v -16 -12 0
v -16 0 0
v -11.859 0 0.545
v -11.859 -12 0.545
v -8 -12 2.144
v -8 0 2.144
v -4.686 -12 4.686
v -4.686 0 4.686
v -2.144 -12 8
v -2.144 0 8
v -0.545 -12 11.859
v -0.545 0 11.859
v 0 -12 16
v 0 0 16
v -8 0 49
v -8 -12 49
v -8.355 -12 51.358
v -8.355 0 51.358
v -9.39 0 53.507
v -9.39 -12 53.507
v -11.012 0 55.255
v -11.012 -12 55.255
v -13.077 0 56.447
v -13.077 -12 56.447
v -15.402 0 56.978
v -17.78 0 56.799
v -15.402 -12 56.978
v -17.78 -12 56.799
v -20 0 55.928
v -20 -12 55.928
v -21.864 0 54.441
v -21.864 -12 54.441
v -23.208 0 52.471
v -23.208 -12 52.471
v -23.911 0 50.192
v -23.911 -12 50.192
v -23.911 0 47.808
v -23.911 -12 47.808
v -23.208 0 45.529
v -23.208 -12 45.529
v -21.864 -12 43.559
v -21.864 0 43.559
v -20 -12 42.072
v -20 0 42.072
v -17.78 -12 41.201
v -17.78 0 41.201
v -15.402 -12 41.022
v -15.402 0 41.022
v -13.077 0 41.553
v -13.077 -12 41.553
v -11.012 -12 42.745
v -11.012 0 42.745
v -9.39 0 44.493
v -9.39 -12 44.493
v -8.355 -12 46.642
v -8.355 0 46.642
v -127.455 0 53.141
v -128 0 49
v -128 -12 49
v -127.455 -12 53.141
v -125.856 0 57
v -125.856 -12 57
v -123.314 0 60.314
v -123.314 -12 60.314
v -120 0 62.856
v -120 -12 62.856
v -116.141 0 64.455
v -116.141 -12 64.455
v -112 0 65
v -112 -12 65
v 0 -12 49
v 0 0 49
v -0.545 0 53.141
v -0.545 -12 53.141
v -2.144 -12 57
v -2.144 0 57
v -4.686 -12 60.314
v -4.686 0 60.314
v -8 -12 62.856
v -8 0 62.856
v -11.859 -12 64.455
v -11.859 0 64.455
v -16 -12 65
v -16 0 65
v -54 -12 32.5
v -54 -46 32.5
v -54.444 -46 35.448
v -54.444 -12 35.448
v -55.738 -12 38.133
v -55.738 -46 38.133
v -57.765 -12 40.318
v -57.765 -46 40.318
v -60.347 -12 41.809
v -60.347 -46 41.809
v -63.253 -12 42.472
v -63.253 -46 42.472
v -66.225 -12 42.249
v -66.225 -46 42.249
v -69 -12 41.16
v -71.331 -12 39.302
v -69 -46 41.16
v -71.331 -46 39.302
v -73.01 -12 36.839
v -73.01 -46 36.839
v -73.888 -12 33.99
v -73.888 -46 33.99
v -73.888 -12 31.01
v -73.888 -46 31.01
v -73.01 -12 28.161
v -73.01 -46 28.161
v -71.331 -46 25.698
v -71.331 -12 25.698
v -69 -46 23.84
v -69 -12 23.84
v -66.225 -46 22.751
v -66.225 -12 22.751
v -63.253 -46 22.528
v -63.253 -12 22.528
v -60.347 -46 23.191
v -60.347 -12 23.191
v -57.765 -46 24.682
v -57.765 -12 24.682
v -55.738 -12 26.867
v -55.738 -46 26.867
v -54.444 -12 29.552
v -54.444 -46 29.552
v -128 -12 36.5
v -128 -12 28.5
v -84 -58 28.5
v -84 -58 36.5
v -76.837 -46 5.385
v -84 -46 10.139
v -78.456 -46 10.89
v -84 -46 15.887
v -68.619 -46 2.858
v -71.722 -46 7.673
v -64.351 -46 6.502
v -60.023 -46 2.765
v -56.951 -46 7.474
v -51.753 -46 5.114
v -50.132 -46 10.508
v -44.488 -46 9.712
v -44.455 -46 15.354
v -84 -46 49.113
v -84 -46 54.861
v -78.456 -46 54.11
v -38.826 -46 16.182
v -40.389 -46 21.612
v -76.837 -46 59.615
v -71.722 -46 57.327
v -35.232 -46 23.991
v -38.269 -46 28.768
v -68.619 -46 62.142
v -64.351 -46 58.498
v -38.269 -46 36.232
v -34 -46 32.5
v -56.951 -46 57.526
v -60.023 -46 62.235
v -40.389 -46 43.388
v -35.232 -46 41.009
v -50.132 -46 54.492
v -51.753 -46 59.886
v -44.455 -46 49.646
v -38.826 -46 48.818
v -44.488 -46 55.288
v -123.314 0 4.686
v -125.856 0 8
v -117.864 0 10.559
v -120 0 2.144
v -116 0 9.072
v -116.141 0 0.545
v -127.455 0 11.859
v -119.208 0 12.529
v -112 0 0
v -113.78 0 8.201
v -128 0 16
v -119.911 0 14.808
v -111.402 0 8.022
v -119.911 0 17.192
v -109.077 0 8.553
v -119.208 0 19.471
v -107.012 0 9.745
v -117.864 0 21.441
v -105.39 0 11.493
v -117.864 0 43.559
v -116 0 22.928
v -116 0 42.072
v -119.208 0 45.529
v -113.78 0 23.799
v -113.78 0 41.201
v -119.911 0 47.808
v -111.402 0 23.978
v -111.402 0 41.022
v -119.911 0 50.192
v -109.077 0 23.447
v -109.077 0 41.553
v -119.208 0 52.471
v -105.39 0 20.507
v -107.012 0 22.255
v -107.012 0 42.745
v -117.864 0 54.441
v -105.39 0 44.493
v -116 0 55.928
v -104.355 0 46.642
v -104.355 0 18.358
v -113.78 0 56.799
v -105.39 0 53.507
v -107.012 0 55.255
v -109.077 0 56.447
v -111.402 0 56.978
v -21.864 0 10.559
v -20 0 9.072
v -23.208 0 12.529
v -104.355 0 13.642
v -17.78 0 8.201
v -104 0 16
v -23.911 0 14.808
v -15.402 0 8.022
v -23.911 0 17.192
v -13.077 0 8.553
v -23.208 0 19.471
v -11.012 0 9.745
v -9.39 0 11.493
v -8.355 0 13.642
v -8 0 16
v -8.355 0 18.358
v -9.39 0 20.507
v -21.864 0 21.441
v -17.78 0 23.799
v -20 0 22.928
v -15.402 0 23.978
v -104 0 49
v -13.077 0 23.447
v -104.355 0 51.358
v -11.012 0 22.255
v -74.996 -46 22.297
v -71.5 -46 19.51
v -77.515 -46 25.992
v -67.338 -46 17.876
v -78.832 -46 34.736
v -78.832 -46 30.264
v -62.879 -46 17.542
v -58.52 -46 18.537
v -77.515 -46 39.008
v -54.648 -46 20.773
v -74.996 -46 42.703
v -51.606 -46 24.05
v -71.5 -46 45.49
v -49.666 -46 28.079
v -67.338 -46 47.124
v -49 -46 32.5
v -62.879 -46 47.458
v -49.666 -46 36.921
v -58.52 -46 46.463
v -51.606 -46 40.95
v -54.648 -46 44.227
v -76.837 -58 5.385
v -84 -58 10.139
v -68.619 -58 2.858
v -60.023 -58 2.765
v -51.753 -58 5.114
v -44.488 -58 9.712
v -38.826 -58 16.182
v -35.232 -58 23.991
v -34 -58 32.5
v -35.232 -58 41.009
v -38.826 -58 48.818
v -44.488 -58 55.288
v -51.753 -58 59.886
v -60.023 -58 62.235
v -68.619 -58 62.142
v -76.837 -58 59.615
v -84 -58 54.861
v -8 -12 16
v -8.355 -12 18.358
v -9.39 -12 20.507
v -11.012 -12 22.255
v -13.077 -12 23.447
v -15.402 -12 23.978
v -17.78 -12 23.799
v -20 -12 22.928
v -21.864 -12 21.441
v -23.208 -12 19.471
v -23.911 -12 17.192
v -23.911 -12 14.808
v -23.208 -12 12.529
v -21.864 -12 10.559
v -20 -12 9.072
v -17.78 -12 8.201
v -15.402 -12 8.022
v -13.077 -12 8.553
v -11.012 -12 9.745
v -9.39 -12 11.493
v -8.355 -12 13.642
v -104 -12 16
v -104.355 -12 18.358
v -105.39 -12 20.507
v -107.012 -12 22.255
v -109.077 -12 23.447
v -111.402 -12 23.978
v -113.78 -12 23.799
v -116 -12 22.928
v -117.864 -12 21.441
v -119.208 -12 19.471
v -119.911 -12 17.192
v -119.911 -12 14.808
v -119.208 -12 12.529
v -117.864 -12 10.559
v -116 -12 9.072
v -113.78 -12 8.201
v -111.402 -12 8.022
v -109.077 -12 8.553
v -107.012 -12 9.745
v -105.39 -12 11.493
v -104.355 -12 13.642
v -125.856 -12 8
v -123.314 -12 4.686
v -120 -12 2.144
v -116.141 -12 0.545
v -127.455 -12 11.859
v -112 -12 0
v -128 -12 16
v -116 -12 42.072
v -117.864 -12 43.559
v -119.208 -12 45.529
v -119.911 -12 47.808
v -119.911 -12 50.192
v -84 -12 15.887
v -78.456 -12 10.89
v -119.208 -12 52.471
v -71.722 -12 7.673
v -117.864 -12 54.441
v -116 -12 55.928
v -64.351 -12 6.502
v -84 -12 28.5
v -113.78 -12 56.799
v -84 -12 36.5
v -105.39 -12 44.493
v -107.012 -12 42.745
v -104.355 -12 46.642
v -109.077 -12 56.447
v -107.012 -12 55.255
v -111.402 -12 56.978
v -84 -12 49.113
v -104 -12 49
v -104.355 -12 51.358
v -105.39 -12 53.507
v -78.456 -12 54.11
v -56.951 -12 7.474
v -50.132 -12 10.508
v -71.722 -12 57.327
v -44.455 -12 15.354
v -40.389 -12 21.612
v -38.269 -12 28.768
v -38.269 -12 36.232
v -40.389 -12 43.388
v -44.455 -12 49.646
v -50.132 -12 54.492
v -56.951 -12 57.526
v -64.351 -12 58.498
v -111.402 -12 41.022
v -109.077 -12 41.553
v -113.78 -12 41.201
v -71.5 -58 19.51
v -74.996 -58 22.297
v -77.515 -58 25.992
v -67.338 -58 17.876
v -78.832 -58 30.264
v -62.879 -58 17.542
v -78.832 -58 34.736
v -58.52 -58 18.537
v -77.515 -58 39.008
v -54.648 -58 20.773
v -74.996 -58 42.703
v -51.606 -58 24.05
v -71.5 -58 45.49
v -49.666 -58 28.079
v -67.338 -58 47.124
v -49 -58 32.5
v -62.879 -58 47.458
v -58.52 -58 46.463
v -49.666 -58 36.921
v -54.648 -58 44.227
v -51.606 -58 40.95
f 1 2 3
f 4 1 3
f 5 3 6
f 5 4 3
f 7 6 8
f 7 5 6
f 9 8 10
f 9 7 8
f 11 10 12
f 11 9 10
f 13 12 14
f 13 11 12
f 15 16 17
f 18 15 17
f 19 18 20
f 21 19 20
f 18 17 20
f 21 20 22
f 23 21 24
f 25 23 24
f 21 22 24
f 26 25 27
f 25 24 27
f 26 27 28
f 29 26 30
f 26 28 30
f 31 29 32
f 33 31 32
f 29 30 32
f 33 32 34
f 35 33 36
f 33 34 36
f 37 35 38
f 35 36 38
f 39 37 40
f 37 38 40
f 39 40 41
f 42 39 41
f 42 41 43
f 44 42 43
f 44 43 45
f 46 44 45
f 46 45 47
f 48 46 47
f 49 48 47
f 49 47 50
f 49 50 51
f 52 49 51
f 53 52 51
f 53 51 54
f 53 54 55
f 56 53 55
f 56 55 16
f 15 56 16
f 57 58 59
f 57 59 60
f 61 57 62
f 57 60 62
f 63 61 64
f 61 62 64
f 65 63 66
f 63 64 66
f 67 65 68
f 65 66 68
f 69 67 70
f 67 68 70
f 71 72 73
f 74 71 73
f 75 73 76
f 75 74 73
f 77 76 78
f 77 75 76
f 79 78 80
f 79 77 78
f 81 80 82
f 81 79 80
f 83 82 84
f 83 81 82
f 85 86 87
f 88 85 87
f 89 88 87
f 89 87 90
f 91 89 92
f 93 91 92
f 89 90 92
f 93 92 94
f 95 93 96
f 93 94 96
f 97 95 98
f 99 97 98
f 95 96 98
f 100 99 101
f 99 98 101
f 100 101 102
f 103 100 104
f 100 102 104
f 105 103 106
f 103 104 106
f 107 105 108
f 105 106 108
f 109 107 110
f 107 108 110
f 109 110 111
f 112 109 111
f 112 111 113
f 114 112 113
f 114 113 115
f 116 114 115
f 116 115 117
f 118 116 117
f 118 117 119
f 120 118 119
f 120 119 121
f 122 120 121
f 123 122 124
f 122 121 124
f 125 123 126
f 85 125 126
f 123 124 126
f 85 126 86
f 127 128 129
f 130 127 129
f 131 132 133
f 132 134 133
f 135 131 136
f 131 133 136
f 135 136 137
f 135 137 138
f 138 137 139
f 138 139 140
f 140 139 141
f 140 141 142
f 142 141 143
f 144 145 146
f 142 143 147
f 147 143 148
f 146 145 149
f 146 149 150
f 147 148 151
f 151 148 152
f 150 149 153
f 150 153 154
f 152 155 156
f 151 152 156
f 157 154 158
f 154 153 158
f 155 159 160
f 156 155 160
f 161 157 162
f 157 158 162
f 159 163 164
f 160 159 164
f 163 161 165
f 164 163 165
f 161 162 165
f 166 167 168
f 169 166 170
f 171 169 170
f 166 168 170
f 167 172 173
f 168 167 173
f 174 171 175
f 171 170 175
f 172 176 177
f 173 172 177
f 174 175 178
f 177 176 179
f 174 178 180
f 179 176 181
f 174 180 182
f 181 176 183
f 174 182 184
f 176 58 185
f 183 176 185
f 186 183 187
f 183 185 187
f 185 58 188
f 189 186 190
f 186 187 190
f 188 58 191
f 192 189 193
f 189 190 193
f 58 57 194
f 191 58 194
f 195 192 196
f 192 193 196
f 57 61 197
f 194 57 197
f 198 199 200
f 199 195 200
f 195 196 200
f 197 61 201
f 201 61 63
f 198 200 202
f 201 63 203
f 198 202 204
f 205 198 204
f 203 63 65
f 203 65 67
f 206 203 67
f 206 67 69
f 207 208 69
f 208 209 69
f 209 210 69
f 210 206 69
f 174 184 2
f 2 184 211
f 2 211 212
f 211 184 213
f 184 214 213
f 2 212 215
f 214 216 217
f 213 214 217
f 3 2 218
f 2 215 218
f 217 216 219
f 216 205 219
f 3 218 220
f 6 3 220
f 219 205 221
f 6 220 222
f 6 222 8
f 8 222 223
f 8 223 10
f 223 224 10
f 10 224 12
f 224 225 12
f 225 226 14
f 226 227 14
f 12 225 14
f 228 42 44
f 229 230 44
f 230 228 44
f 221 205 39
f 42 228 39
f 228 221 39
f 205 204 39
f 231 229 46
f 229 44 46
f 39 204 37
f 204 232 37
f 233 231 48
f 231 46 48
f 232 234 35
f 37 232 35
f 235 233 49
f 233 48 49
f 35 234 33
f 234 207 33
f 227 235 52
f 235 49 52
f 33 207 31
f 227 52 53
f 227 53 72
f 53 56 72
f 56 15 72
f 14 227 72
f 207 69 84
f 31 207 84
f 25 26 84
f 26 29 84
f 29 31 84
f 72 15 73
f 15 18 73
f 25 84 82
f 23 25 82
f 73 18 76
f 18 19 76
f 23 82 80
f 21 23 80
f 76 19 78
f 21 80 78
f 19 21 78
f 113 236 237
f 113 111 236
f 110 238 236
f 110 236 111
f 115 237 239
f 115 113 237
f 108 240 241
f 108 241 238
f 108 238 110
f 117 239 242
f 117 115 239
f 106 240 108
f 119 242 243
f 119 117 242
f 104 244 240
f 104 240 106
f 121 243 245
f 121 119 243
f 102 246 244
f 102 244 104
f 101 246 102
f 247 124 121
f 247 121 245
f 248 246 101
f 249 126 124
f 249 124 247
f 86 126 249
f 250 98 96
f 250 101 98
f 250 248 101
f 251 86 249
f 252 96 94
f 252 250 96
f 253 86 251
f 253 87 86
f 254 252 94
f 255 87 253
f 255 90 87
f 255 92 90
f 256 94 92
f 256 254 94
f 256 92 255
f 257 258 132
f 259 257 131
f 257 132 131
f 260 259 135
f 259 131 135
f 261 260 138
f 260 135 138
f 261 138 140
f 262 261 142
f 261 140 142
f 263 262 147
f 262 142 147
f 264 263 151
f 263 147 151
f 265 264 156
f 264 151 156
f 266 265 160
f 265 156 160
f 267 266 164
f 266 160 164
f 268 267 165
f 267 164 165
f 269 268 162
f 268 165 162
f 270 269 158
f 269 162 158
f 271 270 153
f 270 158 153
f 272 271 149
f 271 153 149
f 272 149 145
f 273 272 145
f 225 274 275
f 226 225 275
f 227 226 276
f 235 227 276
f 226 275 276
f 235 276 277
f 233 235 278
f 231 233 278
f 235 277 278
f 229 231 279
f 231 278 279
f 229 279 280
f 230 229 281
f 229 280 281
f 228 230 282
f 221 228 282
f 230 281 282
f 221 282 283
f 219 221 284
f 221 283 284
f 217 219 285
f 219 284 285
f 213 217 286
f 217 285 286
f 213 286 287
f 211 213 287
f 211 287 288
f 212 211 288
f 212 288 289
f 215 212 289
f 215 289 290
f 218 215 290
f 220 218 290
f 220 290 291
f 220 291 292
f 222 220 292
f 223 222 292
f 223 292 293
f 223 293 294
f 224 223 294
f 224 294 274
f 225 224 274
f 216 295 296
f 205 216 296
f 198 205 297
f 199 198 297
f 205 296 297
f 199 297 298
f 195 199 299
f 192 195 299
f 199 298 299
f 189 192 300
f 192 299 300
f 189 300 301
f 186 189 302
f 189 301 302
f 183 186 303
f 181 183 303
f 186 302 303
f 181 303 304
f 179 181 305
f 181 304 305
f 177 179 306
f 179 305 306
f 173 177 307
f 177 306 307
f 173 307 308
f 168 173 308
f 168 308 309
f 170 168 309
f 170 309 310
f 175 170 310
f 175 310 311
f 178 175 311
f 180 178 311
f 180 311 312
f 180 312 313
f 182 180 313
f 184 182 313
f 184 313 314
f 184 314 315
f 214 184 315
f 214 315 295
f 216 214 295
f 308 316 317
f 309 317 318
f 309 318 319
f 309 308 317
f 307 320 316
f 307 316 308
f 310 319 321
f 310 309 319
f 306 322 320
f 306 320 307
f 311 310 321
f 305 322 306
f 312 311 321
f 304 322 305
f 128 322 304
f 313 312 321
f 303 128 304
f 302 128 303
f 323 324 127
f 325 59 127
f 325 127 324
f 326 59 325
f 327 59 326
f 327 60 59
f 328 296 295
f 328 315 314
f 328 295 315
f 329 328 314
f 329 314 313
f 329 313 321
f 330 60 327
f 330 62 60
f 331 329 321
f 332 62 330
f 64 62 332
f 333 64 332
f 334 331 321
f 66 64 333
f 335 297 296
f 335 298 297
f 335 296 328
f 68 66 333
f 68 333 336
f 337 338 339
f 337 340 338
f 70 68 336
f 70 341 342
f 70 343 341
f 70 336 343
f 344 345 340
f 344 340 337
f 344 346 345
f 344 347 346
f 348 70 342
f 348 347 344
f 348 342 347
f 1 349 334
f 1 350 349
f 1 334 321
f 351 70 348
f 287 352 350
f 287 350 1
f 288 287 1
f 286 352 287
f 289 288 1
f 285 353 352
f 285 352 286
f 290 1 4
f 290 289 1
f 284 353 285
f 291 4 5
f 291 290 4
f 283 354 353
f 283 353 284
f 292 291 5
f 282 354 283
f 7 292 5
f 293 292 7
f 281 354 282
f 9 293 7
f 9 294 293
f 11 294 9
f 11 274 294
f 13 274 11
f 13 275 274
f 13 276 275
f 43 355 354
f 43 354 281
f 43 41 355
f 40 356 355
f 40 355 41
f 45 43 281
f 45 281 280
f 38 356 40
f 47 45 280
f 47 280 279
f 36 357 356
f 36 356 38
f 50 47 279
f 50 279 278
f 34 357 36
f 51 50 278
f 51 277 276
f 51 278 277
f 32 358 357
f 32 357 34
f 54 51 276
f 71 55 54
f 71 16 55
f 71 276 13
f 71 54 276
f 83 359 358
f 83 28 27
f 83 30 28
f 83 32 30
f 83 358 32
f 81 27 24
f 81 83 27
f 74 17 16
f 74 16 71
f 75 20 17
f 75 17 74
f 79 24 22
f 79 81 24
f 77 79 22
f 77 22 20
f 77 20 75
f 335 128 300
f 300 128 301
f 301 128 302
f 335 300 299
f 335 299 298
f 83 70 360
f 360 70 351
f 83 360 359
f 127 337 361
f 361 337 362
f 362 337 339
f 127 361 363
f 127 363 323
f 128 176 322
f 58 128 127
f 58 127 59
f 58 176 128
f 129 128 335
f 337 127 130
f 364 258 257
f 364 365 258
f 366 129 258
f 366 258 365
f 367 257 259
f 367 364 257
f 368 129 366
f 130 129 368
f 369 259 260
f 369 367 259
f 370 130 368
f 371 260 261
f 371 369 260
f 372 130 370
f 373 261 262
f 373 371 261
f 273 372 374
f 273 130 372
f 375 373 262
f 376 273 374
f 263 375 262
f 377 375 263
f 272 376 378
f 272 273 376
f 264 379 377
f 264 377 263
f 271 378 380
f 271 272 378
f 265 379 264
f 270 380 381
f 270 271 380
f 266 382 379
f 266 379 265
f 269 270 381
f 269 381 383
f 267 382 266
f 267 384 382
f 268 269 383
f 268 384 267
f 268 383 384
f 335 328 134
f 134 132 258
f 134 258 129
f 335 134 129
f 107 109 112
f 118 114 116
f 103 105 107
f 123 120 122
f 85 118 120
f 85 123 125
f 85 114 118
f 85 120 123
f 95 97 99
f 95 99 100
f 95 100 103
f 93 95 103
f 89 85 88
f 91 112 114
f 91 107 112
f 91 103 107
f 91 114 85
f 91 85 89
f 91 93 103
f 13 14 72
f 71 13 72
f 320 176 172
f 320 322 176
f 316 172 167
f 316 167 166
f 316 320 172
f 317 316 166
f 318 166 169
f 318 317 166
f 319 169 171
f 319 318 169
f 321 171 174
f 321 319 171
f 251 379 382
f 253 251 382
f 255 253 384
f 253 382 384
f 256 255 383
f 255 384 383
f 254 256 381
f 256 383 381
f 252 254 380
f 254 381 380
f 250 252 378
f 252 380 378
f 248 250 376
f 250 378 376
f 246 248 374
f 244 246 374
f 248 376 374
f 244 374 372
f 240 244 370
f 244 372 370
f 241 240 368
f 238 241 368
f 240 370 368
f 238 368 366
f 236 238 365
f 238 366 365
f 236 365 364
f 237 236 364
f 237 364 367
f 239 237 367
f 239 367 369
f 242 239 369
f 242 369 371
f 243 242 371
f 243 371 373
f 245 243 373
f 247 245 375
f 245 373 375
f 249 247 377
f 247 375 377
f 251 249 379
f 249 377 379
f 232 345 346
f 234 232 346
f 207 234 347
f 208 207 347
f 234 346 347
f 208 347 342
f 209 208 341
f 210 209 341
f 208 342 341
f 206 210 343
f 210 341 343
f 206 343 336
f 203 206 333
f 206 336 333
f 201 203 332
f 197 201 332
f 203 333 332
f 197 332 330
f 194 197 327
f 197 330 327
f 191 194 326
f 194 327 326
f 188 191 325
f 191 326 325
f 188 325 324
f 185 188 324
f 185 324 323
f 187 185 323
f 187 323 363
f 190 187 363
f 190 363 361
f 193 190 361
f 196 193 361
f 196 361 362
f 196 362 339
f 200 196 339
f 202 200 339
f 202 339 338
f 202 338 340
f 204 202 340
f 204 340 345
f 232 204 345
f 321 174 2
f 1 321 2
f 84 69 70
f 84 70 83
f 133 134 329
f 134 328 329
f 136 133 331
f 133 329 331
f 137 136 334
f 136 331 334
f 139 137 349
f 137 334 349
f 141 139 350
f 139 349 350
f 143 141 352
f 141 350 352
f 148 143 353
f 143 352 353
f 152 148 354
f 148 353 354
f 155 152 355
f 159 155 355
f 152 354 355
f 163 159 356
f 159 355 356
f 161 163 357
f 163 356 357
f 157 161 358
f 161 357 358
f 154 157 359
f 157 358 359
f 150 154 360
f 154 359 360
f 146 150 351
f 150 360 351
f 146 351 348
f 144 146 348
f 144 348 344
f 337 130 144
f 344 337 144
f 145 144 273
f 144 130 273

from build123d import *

# Parameters (mm, degrees)
F0_W      = 128
F0_H      = 65
F1_DEPTH  = 12
F2_R      = 16
F3_R      = 26
F4_DEPTH  = 34
F5_R      = 30
F6_DEPTH  = 12
F7_R      = 15
F8_DEPTH  = 12
F9_R      = 10
F10_DEPTH = 34
F12_DEPTH = 46
F13_W     = 44
F13_H     = 8
F14_DEPTH = 46
F16_DEPTH = 25
F17_R     = 8
F18_DEPTH = 25


with BuildPart() as f1:
    # F0 (on Front) → F1 (new body)
    with BuildSketch(Plane.XZ):
        with Locations((-64, 32.5)):
            Rectangle(F0_W, F0_H)
    extrude(amount=F1_DEPTH)

    # F2
    f2_edges = [f1.edges().sort_by_distance(p)[0] for p in [
        (-128, -6, 65),
        (-128, -6, 0),
        (0, -6, 65),
        (0, -6, 0),
    ]]
    fillet(f2_edges, radius=F2_R)

    # F3 (on face) → F4 (join)
    with BuildSketch(Plane.XZ.offset(12)):
        with Locations((-64, 32.5)):
            Circle(F3_R)
    extrude(amount=F4_DEPTH)

    # F5 (on face) → F6 (join)
    with BuildSketch(Plane.XZ.offset(46)):
        with Locations((-64, 32.5)):
            Circle(F5_R)
    extrude(amount=F6_DEPTH)

    # F7 (on face) → F8 (cut)
    with BuildSketch(Plane.XZ.offset(58)):
        with Locations((-64, 32.5)):
            Circle(F7_R)
    extrude(amount=-F8_DEPTH, mode=Mode.SUBTRACT)

    # F9 (on face) → F10 (cut)
    with BuildSketch(Plane.XZ.offset(46)):
        with Locations((-64, 32.5)):
            Circle(F9_R)
    extrude(amount=-F10_DEPTH, mode=Mode.SUBTRACT)

    # F11 (on face) → F12 (cut)
    with BuildSketch(Plane.XZ.offset(58)):
        with BuildLine():
            Line((-84, 10.13932), (-84, 32.5))
            Line((-84, 32.5), (-84, 54.86068))
            ThreePointArc((-84, 54.86068), (-94, 32.5), (-84, 10.13932))
        make_face()
    extrude(amount=-F12_DEPTH, mode=Mode.SUBTRACT)

    # F13 (on face) → F14 (join)
    with BuildSketch(Plane.XZ.offset(12)):
        with Locations((-106, 32.5)):
            Rectangle(F13_W, F13_H)
    extrude(amount=F14_DEPTH)

    # F15 (on face) → F16 (cut)
    with BuildSketch(Plane(origin=(0, 0, 28.5), x_dir=(1, 0, 0), z_dir=(0, 0, -1))):
        Polygon((-128, 12), (-84, 58), (-128, 58), align=None)
    extrude(amount=-F16_DEPTH, mode=Mode.SUBTRACT)

    # F17 (on face) → F18 (cut)
    with BuildSketch(Plane.XZ.offset(12)):
        with Locations((-16, 49)):
            Circle(F17_R)
        with Locations((-16, 16)):
            Circle(F17_R)
        with Locations((-112, 49)):
            Circle(F17_R)
        with Locations((-112, 16)):
            Circle(F17_R)
    extrude(amount=-F18_DEPTH, mode=Mode.SUBTRACT)


solid = f1.part
